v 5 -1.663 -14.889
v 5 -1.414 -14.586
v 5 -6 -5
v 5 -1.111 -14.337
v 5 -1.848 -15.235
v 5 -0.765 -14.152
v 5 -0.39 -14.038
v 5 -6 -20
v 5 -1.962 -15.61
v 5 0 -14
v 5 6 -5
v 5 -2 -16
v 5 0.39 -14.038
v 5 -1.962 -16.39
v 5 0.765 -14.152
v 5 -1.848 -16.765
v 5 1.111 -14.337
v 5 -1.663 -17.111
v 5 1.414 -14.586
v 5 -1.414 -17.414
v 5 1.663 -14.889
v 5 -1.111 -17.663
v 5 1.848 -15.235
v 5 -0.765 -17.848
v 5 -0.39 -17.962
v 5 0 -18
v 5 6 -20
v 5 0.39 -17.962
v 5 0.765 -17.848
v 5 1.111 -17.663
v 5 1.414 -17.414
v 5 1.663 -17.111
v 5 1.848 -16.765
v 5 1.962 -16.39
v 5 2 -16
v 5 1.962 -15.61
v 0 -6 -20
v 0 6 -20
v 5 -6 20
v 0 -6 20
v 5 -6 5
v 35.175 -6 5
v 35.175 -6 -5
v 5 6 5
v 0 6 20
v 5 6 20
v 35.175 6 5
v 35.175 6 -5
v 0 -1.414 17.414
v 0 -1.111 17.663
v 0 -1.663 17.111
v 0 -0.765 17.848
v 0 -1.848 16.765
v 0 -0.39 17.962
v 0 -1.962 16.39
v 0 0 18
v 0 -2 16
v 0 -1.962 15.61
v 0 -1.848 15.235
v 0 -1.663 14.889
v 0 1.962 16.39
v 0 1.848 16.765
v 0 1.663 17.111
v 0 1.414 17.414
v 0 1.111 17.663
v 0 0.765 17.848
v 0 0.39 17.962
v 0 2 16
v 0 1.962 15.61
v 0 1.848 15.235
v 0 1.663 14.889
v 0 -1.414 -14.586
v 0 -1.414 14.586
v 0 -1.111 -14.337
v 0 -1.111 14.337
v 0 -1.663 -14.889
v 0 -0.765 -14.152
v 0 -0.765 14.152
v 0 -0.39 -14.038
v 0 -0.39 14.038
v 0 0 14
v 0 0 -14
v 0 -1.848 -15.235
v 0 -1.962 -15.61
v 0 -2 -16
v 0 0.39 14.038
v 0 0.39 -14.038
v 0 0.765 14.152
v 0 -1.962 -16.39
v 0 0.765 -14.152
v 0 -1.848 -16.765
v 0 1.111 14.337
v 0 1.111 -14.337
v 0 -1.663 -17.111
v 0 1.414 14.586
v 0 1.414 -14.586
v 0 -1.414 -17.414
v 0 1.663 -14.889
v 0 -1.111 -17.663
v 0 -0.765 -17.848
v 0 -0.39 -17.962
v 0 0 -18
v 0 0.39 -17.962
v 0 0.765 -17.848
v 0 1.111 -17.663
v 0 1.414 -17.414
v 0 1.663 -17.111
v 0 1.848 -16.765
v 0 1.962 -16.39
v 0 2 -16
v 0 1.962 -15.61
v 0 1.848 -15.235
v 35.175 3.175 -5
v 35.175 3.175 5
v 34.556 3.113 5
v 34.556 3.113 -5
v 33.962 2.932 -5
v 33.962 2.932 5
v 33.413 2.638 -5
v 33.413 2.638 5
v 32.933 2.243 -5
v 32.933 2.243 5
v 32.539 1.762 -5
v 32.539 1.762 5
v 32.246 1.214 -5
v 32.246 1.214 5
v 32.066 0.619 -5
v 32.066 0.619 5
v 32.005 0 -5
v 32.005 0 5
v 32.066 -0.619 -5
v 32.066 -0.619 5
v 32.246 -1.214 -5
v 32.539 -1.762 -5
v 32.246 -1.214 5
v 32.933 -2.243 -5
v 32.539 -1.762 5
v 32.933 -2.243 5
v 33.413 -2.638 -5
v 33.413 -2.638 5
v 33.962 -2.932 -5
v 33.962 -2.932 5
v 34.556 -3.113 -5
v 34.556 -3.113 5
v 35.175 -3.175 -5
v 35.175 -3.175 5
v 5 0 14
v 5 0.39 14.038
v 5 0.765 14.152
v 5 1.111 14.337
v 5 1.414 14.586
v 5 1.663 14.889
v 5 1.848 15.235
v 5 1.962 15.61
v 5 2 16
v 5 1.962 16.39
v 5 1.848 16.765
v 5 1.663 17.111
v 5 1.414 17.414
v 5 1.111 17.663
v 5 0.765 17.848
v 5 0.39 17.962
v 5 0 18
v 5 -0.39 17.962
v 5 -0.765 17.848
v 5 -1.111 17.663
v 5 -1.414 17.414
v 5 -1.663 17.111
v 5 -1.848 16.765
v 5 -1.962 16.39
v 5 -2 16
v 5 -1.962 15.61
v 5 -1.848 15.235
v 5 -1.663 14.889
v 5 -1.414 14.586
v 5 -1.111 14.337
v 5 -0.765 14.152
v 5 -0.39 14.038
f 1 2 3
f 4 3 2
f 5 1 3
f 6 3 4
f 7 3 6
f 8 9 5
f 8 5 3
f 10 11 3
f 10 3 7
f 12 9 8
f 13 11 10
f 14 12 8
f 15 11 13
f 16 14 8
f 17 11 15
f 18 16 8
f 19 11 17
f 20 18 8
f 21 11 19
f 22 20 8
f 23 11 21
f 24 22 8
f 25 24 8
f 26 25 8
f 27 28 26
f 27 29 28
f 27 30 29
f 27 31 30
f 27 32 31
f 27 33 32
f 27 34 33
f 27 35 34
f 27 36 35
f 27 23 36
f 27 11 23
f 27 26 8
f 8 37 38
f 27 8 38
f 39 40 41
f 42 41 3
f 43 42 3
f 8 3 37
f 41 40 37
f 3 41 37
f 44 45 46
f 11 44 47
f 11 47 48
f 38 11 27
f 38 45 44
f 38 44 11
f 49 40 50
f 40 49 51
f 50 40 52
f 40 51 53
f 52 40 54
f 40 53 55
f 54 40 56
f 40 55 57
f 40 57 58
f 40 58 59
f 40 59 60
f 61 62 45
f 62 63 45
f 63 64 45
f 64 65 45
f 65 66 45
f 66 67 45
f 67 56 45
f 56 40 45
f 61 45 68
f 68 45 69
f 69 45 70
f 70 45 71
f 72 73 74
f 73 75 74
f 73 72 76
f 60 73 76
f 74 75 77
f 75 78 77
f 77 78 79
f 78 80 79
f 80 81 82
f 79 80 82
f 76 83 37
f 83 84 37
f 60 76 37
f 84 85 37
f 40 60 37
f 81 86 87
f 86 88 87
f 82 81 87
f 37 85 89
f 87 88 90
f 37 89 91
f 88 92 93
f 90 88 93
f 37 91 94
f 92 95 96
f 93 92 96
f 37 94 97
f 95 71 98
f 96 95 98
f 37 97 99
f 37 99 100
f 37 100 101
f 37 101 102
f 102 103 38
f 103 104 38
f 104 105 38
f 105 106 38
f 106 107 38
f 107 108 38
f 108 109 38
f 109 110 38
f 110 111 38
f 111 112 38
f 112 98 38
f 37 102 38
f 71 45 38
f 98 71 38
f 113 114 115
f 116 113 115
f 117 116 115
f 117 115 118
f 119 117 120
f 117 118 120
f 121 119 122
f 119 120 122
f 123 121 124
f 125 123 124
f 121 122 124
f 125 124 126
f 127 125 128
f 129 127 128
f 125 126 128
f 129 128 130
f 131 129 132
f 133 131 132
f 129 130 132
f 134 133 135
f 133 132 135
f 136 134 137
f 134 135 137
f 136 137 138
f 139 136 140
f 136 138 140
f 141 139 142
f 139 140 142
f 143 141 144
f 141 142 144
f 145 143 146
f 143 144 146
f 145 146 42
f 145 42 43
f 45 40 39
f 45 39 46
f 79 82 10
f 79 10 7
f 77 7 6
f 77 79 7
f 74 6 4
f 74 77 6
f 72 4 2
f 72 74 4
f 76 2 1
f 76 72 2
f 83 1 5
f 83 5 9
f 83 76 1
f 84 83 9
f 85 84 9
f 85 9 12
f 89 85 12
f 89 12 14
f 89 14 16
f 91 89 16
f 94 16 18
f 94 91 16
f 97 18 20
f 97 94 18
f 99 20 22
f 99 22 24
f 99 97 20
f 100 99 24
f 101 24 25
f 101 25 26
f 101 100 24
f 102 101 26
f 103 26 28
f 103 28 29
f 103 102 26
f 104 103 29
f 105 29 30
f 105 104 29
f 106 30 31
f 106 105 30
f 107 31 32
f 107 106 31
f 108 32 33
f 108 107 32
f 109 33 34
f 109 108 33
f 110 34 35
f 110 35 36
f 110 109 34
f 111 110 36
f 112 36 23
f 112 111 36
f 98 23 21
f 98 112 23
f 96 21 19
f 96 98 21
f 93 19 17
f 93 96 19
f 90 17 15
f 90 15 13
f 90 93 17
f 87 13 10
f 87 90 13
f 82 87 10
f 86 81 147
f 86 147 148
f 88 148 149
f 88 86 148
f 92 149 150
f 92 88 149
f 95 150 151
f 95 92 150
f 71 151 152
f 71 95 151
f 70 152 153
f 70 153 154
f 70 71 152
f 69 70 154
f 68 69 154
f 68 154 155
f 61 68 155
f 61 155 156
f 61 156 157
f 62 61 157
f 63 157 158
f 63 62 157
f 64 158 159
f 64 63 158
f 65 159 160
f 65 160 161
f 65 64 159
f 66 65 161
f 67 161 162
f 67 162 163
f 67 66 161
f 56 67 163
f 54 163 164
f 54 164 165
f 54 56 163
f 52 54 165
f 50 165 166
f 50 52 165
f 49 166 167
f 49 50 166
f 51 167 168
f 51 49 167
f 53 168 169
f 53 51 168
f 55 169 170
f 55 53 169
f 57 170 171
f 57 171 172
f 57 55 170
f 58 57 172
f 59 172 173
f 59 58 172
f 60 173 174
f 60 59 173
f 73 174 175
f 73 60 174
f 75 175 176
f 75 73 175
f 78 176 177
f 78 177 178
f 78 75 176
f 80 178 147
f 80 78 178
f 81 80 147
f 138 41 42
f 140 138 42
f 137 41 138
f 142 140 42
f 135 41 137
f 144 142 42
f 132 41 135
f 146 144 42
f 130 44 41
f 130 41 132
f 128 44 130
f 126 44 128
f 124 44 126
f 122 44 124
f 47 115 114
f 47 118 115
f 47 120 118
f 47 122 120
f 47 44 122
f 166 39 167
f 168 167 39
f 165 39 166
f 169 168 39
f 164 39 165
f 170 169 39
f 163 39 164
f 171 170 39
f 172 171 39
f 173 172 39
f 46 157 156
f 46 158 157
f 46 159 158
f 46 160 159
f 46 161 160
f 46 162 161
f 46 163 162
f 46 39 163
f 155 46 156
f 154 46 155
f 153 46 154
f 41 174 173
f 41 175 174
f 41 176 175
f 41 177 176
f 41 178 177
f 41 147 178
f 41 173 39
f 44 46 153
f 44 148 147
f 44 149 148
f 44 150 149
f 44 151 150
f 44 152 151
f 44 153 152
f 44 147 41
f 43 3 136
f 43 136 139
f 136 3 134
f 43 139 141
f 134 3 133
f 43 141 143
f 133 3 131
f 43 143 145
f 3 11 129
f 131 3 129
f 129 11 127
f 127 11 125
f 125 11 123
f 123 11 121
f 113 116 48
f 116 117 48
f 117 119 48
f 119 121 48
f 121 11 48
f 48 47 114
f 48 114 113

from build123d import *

# Parameters (mm, degrees)
SKETCH1_W           = 40
SKETCH1_H           = 12
SKETCH1_R           = 2
BOSS_EXTRUDE1_DEPTH = 5
SKETCH2_W           = 30.175
SKETCH2_H           = 10
BOSS_EXTRUDE2_DEPTH = 6
SKETCH3_R           = 3.175
CUT_EXTRUDE1_DEPTH  = 17


with BuildPart() as part:
    # Sketch1 → Boss-Extrude1 (new body)
    with BuildSketch(Plane(origin=(0, 0, 0), x_dir=(0, 0, -1), z_dir=(1, 0, 0))):
        Rectangle(SKETCH1_W, SKETCH1_H)
        with Locations((-16, 0)):
            Circle(SKETCH1_R, mode=Mode.SUBTRACT)
        with Locations(Location((16, 0, 0), (0, 0, 180))):
            Circle(SKETCH1_R, mode=Mode.SUBTRACT)
    extrude(amount=BOSS_EXTRUDE1_DEPTH)

    # Sketch2 → Boss-Extrude2 (add, symmetric)
    with BuildSketch(Plane(origin=(0, 0, 0), x_dir=(1, 0, 0), z_dir=(0, 1, 0))):
        with Locations((20.0875, 0)):
            Rectangle(SKETCH2_W, SKETCH2_H)
    extrude(amount=BOSS_EXTRUDE2_DEPTH, both=True)

    # Sketch3 → Cut-Extrude1 (cut, symmetric)
    with BuildSketch(Plane.XY):
        with Locations((35.18, 0)):
            Circle(SKETCH3_R)
    extrude(amount=CUT_EXTRUDE1_DEPTH, both=True, mode=Mode.SUBTRACT)


solid = part.part
